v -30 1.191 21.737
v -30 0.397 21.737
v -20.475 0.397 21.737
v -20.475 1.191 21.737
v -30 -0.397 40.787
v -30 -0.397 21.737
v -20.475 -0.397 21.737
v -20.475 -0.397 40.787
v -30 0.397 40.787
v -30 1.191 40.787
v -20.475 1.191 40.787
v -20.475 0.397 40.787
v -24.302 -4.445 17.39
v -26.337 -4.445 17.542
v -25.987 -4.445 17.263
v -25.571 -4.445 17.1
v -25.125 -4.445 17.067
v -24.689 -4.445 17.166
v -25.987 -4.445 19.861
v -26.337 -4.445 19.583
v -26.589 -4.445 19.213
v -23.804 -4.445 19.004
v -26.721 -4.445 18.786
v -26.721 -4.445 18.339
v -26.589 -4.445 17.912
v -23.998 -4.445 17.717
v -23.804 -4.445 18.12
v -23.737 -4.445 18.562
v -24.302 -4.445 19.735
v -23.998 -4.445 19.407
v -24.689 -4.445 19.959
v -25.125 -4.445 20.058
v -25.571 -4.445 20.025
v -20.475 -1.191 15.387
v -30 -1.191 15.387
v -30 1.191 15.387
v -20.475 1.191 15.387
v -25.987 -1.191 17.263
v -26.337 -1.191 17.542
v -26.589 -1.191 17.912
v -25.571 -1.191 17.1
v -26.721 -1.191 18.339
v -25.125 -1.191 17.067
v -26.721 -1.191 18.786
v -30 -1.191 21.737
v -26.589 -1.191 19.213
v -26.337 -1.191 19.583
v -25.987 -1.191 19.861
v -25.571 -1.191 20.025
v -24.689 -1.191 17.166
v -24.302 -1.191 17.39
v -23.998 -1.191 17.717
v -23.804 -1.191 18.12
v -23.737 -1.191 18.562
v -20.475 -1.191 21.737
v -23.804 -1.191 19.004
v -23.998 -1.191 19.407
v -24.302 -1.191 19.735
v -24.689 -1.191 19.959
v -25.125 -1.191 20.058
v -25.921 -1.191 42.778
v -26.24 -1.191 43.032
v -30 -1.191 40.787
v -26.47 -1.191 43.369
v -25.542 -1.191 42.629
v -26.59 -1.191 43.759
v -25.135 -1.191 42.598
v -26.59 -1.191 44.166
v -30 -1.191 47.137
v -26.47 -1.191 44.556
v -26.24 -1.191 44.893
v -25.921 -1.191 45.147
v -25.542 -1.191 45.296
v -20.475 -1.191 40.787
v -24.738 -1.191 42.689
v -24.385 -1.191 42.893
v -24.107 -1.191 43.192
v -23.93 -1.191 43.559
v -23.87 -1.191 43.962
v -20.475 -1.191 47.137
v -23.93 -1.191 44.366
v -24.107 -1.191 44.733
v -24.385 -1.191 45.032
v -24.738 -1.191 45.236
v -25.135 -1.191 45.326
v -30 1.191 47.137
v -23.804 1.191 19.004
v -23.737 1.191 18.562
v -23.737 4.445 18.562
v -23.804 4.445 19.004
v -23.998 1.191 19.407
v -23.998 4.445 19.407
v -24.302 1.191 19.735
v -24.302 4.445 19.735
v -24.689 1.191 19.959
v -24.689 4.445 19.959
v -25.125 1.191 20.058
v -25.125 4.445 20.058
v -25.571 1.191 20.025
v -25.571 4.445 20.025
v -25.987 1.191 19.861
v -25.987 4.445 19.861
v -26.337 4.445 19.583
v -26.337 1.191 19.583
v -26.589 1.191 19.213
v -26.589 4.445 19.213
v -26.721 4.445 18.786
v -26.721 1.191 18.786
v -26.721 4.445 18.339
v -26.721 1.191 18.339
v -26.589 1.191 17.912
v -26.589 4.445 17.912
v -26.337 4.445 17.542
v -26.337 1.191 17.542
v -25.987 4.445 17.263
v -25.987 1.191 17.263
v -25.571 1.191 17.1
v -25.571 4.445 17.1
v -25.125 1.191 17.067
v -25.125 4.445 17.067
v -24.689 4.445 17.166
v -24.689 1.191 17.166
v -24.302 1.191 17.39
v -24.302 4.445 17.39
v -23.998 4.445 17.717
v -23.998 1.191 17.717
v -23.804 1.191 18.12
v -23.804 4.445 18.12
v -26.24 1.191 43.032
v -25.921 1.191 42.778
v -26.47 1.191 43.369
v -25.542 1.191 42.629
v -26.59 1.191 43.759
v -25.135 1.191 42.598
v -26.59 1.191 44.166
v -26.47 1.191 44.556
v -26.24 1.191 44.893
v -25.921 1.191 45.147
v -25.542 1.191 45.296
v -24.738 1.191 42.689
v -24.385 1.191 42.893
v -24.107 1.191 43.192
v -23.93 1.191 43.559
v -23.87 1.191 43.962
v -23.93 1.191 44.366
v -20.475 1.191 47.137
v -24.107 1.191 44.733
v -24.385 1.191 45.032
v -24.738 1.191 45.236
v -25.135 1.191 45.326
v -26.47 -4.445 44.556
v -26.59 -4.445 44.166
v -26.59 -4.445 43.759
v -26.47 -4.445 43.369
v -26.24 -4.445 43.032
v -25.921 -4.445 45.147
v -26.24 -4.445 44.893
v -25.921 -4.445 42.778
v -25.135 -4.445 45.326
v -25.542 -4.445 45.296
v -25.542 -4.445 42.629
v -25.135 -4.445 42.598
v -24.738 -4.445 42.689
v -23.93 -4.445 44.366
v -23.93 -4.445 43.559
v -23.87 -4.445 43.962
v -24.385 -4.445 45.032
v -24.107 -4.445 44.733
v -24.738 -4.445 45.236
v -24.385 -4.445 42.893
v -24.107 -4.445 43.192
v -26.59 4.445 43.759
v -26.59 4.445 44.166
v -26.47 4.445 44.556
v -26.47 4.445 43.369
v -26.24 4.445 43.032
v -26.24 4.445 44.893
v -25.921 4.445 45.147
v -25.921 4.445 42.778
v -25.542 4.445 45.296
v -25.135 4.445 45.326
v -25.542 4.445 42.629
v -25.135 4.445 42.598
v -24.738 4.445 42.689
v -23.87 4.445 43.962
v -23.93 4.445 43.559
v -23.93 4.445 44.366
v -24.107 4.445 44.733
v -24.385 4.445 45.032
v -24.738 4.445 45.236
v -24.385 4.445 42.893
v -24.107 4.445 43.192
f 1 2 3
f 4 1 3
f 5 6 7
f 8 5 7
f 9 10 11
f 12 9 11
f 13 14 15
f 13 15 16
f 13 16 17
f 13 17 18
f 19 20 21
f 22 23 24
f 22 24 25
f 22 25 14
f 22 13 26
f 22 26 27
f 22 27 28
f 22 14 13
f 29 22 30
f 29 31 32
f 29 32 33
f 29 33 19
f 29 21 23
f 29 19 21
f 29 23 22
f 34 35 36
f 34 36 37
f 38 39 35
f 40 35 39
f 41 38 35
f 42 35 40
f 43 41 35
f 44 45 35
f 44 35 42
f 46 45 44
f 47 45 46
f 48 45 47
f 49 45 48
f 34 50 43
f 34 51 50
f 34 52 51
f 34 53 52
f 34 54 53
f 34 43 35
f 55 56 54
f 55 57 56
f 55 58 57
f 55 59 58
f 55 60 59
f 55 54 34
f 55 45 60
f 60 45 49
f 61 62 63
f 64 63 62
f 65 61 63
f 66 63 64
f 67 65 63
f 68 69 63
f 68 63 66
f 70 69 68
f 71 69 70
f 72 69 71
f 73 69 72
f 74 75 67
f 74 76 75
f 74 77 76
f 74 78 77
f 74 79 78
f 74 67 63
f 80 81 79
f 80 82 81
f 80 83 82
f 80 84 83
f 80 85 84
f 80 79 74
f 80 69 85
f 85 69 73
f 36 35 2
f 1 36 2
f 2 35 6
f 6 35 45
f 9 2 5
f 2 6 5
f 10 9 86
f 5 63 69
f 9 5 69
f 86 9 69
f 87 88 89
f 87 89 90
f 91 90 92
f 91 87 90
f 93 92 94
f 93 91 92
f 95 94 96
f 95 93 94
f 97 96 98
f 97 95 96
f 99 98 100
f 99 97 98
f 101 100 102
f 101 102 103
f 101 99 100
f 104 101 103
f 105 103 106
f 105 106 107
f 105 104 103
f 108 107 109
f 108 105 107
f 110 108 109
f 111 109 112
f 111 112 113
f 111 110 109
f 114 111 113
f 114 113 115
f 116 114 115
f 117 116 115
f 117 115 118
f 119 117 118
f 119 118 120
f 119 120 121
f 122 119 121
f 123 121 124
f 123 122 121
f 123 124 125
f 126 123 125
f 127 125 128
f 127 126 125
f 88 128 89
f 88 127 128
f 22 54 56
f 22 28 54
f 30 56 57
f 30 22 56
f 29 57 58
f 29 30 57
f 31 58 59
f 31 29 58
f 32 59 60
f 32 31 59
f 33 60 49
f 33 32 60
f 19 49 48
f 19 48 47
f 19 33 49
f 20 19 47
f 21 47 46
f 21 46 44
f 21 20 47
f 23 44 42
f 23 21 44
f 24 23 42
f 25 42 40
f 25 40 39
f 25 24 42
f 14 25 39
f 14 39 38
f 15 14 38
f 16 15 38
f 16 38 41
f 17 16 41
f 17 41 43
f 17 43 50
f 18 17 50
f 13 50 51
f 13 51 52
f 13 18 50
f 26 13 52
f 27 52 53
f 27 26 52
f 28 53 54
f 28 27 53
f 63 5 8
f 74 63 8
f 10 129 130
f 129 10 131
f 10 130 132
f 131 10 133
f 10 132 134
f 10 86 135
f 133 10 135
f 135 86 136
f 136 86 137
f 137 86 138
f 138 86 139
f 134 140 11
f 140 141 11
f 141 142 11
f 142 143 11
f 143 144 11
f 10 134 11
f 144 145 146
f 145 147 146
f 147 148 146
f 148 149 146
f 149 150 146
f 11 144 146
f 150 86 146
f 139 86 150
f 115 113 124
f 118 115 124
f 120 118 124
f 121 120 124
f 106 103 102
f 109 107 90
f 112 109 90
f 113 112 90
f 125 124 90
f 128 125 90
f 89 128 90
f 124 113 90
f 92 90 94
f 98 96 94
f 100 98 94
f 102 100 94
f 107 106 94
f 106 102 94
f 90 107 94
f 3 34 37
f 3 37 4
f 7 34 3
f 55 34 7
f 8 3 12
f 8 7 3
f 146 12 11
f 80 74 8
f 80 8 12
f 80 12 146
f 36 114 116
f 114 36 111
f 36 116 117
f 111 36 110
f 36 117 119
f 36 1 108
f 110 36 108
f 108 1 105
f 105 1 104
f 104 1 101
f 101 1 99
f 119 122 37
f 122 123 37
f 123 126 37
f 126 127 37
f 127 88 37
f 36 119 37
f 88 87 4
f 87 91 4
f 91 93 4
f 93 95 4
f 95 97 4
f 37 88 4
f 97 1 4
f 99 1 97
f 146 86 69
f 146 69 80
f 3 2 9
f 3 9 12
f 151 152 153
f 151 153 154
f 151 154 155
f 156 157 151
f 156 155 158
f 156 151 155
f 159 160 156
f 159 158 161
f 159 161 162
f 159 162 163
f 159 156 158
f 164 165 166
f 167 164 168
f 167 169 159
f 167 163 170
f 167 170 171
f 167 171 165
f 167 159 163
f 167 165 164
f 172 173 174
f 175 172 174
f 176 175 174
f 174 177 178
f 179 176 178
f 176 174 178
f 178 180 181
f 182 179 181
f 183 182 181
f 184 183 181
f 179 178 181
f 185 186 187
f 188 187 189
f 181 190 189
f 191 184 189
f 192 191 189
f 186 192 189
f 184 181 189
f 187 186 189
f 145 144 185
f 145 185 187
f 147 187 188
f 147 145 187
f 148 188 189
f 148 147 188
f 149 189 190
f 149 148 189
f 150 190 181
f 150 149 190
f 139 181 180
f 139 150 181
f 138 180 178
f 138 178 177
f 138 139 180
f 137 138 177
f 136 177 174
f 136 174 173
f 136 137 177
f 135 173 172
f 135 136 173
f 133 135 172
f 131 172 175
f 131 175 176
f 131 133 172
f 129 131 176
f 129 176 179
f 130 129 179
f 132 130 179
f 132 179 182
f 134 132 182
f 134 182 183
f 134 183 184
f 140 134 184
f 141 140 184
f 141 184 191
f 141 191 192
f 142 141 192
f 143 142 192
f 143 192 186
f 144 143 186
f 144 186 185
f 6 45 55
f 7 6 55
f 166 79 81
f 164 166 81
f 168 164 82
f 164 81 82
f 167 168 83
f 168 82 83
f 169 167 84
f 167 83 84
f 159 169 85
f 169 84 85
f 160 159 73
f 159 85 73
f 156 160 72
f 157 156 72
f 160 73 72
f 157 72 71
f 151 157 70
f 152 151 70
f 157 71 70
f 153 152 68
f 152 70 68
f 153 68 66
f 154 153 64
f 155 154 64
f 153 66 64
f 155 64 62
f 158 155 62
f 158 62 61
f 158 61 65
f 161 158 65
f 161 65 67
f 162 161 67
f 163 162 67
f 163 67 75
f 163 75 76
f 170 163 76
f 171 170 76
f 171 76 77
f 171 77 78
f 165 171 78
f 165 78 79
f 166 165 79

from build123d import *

# Parameters (mm, degrees)
F0_W     = 9.525
F0_H     = 19.05
F1_DEPTH = 0.396875
F0_H_2   = 6.35
F0_R     = 1.367696
F0_R_2   = 1.5
F2_DEPTH = 1.190625
F3_DEPTH = 4.445


with BuildPart() as f1:
    # F0 (on Front) → F1 (new body, symmetric)
    with BuildSketch(Plane.XZ):
        with Locations((-25.237318, 31.262366)):
            Rectangle(F0_W, F0_H)
    extrude(amount=F1_DEPTH, both=True)

    # F0 (on Front) → F2 (join, symmetric)
    with BuildSketch(Plane.XZ):
        with Locations((-25.237318, 43.962366)):
            Rectangle(F0_W, F0_H_2)
        with Locations((-25.237318, 43.962366)):
            Circle(F0_R, mode=Mode.SUBTRACT)
        with Locations((-25.237318, 18.562366)):
            Rectangle(F0_W, F0_H_2)
        with Locations((-25.237318, 18.562366)):
            Circle(F0_R_2, mode=Mode.SUBTRACT)
    extrude(amount=F2_DEPTH, both=True)

    # F0 (on Front) → F3 (join, symmetric)
    with BuildSketch(Plane.XZ):
        with Locations((-25.237318, 43.962366)):
            Circle(F0_R)
        with Locations((-25.237318, 18.562366)):
            Circle(F0_R_2)
    extrude(amount=F3_DEPTH, both=True)


solid = f1.part
